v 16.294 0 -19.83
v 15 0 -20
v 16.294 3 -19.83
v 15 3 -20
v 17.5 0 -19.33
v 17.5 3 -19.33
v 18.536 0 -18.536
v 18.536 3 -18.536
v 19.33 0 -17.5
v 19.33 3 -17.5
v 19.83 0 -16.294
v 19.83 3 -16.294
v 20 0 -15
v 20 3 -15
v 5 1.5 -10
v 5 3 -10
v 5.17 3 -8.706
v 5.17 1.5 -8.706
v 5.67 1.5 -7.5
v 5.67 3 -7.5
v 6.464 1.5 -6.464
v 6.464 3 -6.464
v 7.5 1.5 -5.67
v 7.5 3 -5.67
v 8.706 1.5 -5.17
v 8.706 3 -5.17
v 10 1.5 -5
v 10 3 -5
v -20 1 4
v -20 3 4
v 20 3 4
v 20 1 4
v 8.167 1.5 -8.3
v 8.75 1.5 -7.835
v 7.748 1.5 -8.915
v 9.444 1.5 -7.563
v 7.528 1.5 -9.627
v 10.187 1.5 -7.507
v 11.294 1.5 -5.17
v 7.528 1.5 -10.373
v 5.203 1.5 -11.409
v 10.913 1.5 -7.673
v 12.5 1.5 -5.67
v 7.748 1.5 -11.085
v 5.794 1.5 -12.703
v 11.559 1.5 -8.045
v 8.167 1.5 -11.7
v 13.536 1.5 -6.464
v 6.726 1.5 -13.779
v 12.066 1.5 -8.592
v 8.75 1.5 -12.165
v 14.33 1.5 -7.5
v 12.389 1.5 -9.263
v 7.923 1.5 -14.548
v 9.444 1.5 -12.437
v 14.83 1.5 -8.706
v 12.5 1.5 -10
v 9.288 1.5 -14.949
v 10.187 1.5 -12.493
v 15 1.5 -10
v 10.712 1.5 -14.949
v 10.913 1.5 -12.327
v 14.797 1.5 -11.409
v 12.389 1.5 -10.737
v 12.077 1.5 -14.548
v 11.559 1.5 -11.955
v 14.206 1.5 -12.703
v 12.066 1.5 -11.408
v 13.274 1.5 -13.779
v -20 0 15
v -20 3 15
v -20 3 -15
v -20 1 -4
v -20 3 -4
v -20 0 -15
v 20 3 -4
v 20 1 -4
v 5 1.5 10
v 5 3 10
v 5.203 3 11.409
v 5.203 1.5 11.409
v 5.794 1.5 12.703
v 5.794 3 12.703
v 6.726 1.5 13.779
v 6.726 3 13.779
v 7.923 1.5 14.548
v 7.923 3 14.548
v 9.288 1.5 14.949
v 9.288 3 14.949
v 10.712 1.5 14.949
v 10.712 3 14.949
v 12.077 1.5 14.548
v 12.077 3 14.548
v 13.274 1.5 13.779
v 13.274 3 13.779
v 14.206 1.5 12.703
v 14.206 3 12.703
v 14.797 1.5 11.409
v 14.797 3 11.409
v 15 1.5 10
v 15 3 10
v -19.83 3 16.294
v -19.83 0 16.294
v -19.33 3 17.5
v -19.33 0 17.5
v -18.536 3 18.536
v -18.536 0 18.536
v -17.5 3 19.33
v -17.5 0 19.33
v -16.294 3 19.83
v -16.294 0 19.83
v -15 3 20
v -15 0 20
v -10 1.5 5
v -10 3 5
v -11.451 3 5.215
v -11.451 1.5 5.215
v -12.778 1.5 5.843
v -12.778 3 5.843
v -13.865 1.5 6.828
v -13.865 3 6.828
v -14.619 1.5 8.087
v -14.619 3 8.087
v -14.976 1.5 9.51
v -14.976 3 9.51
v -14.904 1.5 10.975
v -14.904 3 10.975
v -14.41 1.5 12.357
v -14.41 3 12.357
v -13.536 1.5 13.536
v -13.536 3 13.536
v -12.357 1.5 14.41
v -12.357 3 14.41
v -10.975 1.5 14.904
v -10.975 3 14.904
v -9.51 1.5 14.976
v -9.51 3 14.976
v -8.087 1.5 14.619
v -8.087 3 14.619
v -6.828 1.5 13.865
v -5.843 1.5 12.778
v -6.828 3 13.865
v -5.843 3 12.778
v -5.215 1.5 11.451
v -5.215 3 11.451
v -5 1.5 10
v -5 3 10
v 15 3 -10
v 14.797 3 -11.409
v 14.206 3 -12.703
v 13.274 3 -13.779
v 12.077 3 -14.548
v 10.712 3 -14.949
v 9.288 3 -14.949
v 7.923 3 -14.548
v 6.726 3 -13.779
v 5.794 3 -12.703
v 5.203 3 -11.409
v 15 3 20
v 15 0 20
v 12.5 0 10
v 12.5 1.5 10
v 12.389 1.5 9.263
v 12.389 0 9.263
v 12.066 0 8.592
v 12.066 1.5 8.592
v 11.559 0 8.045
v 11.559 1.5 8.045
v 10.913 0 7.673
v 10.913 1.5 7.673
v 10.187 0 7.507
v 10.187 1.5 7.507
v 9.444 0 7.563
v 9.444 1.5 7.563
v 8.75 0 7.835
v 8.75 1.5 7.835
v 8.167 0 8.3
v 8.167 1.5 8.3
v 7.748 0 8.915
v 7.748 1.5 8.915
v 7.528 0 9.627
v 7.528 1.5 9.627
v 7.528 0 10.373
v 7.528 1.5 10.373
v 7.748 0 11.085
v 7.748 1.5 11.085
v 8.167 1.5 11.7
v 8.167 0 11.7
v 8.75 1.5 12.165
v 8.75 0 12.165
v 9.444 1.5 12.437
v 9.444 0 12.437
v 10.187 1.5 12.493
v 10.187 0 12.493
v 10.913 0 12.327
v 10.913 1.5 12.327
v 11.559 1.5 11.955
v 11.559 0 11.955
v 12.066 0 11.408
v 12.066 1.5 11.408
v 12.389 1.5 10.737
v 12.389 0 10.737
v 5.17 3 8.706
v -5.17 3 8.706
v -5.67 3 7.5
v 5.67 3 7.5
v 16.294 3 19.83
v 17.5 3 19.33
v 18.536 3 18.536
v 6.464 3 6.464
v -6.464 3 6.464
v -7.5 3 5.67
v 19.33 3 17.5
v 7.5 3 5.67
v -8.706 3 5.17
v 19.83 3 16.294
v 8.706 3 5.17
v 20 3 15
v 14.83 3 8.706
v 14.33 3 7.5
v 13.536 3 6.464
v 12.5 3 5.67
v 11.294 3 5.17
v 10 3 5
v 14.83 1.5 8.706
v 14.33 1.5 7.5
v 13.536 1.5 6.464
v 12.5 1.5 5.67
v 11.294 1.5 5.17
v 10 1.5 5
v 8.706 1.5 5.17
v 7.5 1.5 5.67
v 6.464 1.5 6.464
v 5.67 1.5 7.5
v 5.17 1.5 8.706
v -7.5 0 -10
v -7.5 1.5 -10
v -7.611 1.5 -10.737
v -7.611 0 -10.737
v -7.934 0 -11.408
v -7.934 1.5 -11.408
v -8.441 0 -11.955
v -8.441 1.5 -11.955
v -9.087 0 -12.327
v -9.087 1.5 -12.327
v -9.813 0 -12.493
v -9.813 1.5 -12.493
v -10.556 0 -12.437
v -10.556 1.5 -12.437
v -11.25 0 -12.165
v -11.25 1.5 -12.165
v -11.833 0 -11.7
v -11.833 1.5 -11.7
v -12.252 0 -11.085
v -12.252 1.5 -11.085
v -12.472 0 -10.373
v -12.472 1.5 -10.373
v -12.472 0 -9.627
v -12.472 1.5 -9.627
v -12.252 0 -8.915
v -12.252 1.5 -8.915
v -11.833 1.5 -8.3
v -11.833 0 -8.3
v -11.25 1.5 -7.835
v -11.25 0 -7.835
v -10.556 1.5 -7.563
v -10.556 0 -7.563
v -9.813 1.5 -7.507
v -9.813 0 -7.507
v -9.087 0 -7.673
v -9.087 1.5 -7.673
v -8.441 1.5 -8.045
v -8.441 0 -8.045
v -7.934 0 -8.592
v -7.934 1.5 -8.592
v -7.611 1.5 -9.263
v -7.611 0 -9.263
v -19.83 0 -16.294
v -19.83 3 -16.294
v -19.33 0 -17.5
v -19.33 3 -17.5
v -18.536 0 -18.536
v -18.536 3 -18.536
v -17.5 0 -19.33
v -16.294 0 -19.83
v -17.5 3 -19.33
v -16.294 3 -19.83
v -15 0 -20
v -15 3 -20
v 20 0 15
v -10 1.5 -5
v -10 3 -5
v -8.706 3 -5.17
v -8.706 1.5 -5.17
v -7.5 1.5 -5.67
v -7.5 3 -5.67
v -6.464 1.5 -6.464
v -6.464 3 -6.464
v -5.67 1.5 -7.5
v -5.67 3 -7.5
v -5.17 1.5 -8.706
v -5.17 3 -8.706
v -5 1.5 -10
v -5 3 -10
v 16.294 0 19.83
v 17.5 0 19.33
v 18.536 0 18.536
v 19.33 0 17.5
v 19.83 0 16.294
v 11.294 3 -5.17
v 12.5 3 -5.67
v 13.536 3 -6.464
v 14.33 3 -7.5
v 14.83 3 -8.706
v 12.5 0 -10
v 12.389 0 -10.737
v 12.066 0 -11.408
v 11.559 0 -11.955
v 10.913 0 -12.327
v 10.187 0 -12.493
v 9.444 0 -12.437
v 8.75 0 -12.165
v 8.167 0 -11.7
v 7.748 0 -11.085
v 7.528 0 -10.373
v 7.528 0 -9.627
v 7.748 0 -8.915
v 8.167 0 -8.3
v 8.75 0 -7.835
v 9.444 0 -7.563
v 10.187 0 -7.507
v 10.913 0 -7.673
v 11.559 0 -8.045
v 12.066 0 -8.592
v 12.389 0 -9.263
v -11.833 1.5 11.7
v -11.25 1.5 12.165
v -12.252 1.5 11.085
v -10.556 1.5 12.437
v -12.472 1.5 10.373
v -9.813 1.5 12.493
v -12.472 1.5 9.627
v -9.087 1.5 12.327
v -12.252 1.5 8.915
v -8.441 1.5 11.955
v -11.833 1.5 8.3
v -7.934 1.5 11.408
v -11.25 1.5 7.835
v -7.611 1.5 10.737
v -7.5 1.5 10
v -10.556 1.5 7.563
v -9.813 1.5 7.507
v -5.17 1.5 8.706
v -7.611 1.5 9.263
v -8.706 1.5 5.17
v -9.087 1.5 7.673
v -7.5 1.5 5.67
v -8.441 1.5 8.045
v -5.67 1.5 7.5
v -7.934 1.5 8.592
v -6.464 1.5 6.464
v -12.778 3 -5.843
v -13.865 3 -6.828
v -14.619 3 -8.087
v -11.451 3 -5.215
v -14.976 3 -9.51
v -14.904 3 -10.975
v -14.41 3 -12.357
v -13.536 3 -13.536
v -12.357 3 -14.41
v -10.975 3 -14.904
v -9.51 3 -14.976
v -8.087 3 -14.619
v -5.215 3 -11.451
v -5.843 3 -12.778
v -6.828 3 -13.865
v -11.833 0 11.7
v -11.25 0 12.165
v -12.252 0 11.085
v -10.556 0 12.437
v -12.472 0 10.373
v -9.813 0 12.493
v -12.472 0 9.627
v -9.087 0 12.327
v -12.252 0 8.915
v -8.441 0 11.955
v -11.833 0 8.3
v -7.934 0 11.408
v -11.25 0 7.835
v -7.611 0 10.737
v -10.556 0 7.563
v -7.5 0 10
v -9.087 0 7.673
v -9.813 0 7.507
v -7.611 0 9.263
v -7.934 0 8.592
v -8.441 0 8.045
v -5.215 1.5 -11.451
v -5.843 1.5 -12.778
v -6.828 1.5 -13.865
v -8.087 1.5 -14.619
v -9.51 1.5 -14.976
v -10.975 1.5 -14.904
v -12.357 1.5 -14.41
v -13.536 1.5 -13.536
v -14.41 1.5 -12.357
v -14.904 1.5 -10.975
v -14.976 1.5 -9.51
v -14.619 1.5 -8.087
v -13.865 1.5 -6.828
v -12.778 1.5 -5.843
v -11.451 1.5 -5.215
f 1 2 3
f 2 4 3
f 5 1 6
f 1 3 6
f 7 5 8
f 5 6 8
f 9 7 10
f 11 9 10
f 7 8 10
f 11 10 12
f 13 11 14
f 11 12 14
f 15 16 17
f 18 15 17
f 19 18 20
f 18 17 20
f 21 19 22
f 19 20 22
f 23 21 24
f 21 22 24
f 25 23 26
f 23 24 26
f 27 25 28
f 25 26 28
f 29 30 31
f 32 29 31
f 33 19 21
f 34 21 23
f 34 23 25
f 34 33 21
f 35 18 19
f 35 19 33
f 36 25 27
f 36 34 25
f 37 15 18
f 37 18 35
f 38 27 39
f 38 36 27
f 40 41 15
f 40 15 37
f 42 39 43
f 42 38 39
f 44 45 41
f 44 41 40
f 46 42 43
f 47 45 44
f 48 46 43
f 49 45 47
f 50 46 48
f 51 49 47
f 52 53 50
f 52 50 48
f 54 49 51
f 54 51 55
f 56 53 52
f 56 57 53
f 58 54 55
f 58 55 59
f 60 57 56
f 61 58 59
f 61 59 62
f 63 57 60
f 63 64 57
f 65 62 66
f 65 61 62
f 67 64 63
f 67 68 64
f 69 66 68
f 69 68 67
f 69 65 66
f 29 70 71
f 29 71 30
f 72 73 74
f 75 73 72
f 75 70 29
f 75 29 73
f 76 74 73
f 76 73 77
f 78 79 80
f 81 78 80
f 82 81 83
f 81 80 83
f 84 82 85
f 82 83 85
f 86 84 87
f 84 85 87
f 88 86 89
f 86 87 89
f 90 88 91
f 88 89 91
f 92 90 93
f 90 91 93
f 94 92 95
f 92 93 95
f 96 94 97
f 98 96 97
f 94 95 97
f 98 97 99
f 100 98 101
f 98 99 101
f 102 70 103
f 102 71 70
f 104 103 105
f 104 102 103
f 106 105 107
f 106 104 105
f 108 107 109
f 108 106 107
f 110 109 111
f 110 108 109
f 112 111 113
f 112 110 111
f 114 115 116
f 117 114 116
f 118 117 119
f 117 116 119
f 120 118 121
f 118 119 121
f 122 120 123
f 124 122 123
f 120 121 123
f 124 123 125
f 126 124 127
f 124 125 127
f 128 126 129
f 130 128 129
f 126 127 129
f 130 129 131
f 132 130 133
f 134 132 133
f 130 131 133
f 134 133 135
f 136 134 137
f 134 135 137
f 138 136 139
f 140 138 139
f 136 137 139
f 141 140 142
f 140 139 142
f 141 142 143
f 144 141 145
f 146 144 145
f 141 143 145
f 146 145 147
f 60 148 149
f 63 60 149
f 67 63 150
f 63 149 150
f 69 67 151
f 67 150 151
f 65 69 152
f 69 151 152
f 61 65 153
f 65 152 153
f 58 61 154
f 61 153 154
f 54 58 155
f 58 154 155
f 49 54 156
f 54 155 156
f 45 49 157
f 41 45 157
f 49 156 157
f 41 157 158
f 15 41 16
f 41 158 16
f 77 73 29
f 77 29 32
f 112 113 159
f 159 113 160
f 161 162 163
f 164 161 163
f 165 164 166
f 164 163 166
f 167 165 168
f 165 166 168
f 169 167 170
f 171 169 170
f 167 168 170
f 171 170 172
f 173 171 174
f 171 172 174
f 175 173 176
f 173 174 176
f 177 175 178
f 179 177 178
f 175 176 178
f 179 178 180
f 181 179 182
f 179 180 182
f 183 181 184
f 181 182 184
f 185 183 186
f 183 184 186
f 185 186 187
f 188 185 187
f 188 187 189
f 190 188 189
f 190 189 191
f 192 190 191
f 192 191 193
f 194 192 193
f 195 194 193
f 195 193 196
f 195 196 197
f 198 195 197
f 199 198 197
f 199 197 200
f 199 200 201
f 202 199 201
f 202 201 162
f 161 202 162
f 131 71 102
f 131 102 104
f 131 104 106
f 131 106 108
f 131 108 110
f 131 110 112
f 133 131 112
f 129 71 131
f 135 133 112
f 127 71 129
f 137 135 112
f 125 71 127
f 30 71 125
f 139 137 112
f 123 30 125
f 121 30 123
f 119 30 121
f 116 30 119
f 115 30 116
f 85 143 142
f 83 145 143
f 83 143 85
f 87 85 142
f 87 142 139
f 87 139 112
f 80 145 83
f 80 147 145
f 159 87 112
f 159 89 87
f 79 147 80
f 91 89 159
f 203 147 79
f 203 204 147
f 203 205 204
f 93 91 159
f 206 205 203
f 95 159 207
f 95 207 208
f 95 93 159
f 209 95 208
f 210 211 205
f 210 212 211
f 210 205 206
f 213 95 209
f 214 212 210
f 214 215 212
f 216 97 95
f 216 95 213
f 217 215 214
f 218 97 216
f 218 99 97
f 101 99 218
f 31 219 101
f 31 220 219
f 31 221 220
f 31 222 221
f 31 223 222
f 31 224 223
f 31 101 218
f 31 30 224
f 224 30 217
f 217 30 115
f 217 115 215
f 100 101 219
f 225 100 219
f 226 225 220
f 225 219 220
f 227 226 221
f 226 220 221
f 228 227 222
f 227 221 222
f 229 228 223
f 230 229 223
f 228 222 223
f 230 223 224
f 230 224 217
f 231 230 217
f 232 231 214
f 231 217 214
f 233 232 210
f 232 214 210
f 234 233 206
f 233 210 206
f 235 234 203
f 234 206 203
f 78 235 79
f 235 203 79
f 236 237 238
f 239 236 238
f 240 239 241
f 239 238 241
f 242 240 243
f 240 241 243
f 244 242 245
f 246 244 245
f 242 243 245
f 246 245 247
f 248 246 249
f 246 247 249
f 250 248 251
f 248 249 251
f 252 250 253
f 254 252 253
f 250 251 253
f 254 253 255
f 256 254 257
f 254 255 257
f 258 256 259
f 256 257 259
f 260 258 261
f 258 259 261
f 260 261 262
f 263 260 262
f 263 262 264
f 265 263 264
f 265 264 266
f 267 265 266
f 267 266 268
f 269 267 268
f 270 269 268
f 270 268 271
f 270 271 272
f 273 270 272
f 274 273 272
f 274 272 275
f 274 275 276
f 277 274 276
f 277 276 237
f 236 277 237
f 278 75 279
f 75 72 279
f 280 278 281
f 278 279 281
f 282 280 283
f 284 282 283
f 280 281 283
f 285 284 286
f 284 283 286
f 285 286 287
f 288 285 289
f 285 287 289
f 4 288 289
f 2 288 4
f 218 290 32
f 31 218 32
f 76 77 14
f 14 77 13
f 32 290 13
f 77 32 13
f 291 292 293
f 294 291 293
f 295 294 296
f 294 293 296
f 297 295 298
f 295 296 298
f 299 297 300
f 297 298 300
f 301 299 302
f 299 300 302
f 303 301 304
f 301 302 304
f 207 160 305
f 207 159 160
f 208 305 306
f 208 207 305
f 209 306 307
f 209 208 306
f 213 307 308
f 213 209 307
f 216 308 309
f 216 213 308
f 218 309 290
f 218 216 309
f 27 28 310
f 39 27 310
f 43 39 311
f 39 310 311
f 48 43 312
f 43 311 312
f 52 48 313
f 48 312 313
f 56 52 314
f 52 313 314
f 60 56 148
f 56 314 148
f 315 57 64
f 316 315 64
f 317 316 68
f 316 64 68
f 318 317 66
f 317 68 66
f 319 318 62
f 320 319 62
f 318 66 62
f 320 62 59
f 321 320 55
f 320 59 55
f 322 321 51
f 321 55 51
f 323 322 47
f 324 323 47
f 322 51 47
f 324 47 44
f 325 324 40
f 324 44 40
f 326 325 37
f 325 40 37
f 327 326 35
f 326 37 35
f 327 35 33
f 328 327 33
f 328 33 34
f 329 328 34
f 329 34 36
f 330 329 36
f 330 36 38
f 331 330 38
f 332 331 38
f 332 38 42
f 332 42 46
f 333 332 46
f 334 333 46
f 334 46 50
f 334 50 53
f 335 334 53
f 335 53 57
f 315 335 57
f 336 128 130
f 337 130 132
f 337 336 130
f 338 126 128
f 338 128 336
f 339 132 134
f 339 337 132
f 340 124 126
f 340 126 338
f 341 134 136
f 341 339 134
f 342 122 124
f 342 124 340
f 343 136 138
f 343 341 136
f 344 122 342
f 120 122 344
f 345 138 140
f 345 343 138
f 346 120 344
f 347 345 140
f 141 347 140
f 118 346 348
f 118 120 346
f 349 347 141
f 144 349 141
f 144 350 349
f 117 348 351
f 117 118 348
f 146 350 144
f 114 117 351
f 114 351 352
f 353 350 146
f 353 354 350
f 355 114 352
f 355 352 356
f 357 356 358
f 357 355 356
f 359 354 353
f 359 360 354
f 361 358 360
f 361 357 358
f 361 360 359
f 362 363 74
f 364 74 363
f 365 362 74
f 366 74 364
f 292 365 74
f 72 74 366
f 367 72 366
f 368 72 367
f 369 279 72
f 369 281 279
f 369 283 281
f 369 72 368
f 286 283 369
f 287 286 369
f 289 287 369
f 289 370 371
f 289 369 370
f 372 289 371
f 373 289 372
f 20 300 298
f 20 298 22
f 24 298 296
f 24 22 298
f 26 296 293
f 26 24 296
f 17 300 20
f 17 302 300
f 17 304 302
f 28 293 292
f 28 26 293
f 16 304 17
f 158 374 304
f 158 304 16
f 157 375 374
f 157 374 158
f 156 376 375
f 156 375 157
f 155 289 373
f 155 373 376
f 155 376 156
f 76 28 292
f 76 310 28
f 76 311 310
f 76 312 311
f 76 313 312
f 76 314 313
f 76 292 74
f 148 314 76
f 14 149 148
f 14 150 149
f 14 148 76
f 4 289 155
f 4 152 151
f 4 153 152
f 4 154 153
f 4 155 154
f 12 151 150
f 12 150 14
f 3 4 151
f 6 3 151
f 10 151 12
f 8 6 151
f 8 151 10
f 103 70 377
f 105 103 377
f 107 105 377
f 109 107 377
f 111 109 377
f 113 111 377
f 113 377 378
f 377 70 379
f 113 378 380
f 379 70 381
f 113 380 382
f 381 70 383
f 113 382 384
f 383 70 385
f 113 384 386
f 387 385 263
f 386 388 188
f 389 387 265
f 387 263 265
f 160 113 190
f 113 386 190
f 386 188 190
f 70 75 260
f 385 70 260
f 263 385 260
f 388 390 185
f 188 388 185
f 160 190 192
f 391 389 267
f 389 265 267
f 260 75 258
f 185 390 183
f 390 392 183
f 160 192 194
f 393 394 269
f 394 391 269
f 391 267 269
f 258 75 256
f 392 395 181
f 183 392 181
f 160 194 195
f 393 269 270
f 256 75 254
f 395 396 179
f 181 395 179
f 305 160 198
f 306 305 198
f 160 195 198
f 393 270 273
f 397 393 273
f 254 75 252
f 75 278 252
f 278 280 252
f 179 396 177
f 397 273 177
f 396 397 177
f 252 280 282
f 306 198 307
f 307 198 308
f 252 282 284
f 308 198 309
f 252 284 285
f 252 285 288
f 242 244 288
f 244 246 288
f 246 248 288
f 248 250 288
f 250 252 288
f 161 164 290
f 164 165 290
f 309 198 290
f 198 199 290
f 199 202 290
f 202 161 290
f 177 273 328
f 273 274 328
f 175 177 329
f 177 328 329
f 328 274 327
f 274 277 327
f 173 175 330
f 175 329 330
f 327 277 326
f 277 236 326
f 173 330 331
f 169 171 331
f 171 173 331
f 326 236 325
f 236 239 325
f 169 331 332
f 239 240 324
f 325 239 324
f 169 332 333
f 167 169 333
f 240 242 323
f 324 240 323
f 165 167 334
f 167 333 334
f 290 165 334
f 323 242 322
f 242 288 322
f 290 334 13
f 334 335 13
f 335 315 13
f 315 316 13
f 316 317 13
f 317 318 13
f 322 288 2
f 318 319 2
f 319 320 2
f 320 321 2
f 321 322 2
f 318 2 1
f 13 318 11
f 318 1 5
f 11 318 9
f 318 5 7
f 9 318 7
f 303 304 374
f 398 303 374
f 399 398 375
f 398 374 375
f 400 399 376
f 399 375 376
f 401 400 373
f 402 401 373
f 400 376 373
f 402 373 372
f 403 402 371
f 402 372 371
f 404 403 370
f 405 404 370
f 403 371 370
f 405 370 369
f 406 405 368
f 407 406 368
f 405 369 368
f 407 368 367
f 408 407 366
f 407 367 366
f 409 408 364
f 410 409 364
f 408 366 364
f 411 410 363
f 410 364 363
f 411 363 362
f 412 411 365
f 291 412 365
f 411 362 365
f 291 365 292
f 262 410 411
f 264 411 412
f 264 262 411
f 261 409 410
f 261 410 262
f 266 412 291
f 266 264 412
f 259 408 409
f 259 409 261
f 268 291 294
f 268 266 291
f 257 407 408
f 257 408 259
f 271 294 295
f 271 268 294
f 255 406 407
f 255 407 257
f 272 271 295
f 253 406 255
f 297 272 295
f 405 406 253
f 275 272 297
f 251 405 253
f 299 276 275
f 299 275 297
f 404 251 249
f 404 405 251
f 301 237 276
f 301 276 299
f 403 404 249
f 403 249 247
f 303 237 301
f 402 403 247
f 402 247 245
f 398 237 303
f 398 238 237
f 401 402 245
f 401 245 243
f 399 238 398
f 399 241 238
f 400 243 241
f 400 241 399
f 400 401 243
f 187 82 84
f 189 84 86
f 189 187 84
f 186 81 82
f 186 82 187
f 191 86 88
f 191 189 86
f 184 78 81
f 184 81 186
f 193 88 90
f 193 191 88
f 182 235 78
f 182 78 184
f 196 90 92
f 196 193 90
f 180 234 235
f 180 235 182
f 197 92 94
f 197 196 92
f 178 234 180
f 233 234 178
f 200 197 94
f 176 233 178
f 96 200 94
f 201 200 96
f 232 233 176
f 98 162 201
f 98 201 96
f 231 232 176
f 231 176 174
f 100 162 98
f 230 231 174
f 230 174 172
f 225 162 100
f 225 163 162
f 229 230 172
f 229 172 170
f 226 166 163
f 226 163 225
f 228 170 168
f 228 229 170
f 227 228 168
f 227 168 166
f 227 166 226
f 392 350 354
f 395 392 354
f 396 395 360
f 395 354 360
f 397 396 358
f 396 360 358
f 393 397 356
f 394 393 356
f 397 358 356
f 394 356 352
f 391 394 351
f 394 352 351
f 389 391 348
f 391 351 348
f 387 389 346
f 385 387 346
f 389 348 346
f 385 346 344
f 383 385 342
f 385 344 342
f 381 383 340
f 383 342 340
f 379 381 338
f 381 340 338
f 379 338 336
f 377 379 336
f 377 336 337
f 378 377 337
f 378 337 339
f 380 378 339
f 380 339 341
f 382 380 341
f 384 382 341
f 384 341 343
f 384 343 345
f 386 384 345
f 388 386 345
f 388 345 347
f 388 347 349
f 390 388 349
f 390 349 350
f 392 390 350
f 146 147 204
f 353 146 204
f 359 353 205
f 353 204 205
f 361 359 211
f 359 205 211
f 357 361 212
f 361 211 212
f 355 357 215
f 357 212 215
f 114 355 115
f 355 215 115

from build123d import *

# Parameters (mm, degrees)
SKETCH1_W           = 40
SKETCH1_H           = 40
BOSS_EXTRUDE1_DEPTH = 3
CUT_EXTRUDE1_DEPTH  = 1.5
SKETCH3_R           = 2.5
CUT_EXTRUDE2_DEPTH  = 2.5
FILLET1_R           = 5
SKETCH4_W           = 40
SKETCH4_H           = 8
CUT_EXTRUDE3_DEPTH  = 2


with BuildPart() as part:
    # Sketch1 → Boss-Extrude1 (new body)
    with BuildSketch(Plane(origin=(0, 0, 0), x_dir=(1, 0, 0), z_dir=(0, 1, 0))):
        Rectangle(SKETCH1_W, SKETCH1_H)
    extrude(amount=BOSS_EXTRUDE1_DEPTH)

    # Sketch2 → Cut-Extrude1 (cut)
    with BuildSketch(Plane(origin=(0, 3, 0), x_dir=(1, 0, 0), z_dir=(0, 1, 0))):
        with BuildLine():
            ThreePointArc((-5, 10), (-13.535533906, 13.535533906), (-10, 5))
            Line((-10, 5), (-10, 10))
            Line((-10, 10), (-5, 10))
        make_face()
        with BuildLine():
            Line((-10, 10), (-10, 5))
            ThreePointArc((-10, 5), (-6.464466094, 6.464466094), (-5, 10))
            Line((-5, 10), (-10, 10))
        make_face()
        with BuildLine():
            ThreePointArc((5, 10), (6.464466094, 6.464466094), (10, 5))
            Line((10, 5), (10, 10))
            Line((10, 10), (5, 10))
        make_face()
        with BuildLine():
            Line((10, 10), (10, 5))
            ThreePointArc((10, 5), (13.535533906, 6.464466094), (15, 10))
            ThreePointArc((15, 10), (10, 15), (5, 10))
            Line((5, 10), (10, 10))
        make_face()
        with BuildLine():
            Line((-10, -5), (-10, -10))
            Line((-10, -10), (-5, -10))
            ThreePointArc((-5, -10), (-6.464466094, -6.464466094), (-10, -5))
        make_face()
        with BuildLine():
            Line((-5, -10), (-10, -10))
            Line((-10, -10), (-10, -5))
            ThreePointArc((-10, -5), (-13.535533906, -13.535533906), (-5, -10))
        make_face()
        with BuildLine():
            ThreePointArc((10, -5), (6.464466094, -6.464466094), (5, -10))
            Line((5, -10), (10, -10))
            Line((10, -10), (10, -5))
        make_face()
        with BuildLine():
            Line((10, -10), (5, -10))
            ThreePointArc((5, -10), (10, -15), (15, -10))
            ThreePointArc((15, -10), (13.535533906, -6.464466094), (10, -5))
            Line((10, -5), (10, -10))
        make_face()
    extrude(amount=-CUT_EXTRUDE1_DEPTH, mode=Mode.SUBTRACT)

    # Sketch3 → Cut-Extrude2 (cut, through all)
    with BuildSketch(Plane(origin=(0, 1.5, 0), x_dir=(1, 0, 0), z_dir=(0, 1, 0))):
        with Locations((-10, 10)):
            Circle(SKETCH3_R)
        with Locations((10, 10)):
            Circle(SKETCH3_R)
        with Locations((-10, -10)):
            Circle(SKETCH3_R)
        with Locations((10, -10)):
            Circle(SKETCH3_R)
    extrude(amount=-CUT_EXTRUDE2_DEPTH, mode=Mode.SUBTRACT)

    # Fillet1
    fillet1_edges = [part.edges().sort_by_distance(p)[0] for p in [
        (20, 1.5, 20),
        (-20, 1.5, 20),
        (-20, 1.5, -20),
        (20, 1.5, -20),
    ]]
    fillet(fillet1_edges, radius=FILLET1_R)

    # Sketch4 → Cut-Extrude3 (cut)
    with BuildSketch(Plane(origin=(0, 3, 0), x_dir=(1, 0, 0), z_dir=(0, 1, 0))):
        Rectangle(SKETCH4_W, SKETCH4_H)
    extrude(amount=-CUT_EXTRUDE3_DEPTH, mode=Mode.SUBTRACT)


solid = part.part
